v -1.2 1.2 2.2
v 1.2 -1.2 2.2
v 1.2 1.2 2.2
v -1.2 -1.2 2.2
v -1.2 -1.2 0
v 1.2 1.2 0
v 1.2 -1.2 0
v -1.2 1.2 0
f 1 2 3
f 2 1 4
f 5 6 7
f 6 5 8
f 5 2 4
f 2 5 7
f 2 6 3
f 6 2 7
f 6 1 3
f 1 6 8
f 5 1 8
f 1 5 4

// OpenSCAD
// file: ../common/util.scad
// utility functions

module rotational_clone(clones=2) {
  for(i=[0:clones-1] ) {
    rotate([0,0,i * (360/clones)]) children();
  }
}
// file: ../settings.scad
/*
 *   Edit these settings to control the generated keycaps
 */

/* height of the part the finger rests on, doesn't exclude higher protrusions,
       eg. the saddle keycap rises on either side of the thumb for leverage */
effective_height=16+5;
//effective_height=11;

// maximum width in any direction, strict limit to prevent collision with adjacent keycaps
total_width=16;

// how thick the keycap, excluding the stem, should be. mostly aesthetic preference?
minimum_thickness = 1;


keycap_style = "trackpoint-lp";

/* can be auto (computationally expensive), manual (a bit janky, needs to be implemented for each keycap), or none.
     has no effect on certain keycaps such as trackpoint variants */
chamfer_style = "auto";

/* this allows you to rotate the keycap if the finger approaches at an angle
   you probably only want to rotate the Z-axis (third value) */
keycap_rotation = [0,0,0];


stem_model = "trackpoint-lp-clamp";


// "cr10 or "prusa" have presets, any other string will use a default tolerance, usually 0
printer = "prusa";

// slop factors for imprecision in the printing process
/*
vertical_slop = 0.1;
inner_slop = 0.4;
outer_slop = 0.2;
*/

/* -----------------------------------------------------------------------
 *  Do Not Edit - this machinery is consistent regardless of above values
 * -----------------------------------------------------------------------
 */

function auto_chamfer() = chamfer_style == "auto";

function manual_chamfer() = chamfer_style == "manual";
// file: trackpoint-lp.scad
/*
 *  A mount for a low profile Trackpoint rubber cap
 */

// ignores minimum_thickness, chamfer_style, etc so this isn't really needed atm
include <../settings.scad>;
use <../common/util.scad>

//$inner_slop_x = 0.0;
//$inner_slop_y = -0.0;
outer_slop = 0.1;
print_width = .4;
layer_height=.2;
first_layer=.2;

// it may vary somewhat, but the height of my rubber cap is 5mm
function height_offset() = 5;

side = 2.5;
raw_height=2.5;
function height(stem=true) = (stem?first_layer:0) + floor((raw_height-(stem?first_layer:0))/layer_height)*layer_height;

function adjusted_side_x(stem=true) = stem ? side + (is_undef($inner_slop_x) ? 0 : $inner_slop_x) : side - outer_slop;
function adjusted_side_y(stem=true) = stem ? side + (is_undef($inner_slop_y) ? 0 : $inner_slop_y) : side - outer_slop;
// this alias is for using when making a hole for a stem
module cap_tplp(stem=true) {
  //adjusted_side = adjusted_side();
  adjusted_height = height(stem) + (stem?0*layer_height:-layer_height);

  translate([0,0,adjusted_height/2]) cube([adjusted_side_x(stem=stem),adjusted_side_y(stem=stem),adjusted_height],true);
  if(stem) {
    let(inside=.2,outside=print_width,s=inside+outside) {
      translate([adjusted_side_x(stem=stem)/2-inside,adjusted_side_y(stem=stem)/2-inside,0]) cube([s,s,adjusted_height]);
      translate([-adjusted_side_x(stem=stem)/2-outside,-adjusted_side_y(stem=stem)/2-outside,0]) cube([s,s,adjusted_height]);
      translate([adjusted_side_x(stem=stem)/2-inside,-adjusted_side_y(stem=stem)/2-outside,0]) cube([s,s,adjusted_height]);
      translate([-adjusted_side_x(stem=stem)/2-outside,adjusted_side_y(stem=stem)/2-inside,0]) cube([s,s,adjusted_height]);
    }
  }
}

// this is for using as a cap
module cap() {
  cap_tplp(stem=false);
}

cap($fn=12);
// main file
include <trackpoint-lp.scad>

function height_offset() = 3;
